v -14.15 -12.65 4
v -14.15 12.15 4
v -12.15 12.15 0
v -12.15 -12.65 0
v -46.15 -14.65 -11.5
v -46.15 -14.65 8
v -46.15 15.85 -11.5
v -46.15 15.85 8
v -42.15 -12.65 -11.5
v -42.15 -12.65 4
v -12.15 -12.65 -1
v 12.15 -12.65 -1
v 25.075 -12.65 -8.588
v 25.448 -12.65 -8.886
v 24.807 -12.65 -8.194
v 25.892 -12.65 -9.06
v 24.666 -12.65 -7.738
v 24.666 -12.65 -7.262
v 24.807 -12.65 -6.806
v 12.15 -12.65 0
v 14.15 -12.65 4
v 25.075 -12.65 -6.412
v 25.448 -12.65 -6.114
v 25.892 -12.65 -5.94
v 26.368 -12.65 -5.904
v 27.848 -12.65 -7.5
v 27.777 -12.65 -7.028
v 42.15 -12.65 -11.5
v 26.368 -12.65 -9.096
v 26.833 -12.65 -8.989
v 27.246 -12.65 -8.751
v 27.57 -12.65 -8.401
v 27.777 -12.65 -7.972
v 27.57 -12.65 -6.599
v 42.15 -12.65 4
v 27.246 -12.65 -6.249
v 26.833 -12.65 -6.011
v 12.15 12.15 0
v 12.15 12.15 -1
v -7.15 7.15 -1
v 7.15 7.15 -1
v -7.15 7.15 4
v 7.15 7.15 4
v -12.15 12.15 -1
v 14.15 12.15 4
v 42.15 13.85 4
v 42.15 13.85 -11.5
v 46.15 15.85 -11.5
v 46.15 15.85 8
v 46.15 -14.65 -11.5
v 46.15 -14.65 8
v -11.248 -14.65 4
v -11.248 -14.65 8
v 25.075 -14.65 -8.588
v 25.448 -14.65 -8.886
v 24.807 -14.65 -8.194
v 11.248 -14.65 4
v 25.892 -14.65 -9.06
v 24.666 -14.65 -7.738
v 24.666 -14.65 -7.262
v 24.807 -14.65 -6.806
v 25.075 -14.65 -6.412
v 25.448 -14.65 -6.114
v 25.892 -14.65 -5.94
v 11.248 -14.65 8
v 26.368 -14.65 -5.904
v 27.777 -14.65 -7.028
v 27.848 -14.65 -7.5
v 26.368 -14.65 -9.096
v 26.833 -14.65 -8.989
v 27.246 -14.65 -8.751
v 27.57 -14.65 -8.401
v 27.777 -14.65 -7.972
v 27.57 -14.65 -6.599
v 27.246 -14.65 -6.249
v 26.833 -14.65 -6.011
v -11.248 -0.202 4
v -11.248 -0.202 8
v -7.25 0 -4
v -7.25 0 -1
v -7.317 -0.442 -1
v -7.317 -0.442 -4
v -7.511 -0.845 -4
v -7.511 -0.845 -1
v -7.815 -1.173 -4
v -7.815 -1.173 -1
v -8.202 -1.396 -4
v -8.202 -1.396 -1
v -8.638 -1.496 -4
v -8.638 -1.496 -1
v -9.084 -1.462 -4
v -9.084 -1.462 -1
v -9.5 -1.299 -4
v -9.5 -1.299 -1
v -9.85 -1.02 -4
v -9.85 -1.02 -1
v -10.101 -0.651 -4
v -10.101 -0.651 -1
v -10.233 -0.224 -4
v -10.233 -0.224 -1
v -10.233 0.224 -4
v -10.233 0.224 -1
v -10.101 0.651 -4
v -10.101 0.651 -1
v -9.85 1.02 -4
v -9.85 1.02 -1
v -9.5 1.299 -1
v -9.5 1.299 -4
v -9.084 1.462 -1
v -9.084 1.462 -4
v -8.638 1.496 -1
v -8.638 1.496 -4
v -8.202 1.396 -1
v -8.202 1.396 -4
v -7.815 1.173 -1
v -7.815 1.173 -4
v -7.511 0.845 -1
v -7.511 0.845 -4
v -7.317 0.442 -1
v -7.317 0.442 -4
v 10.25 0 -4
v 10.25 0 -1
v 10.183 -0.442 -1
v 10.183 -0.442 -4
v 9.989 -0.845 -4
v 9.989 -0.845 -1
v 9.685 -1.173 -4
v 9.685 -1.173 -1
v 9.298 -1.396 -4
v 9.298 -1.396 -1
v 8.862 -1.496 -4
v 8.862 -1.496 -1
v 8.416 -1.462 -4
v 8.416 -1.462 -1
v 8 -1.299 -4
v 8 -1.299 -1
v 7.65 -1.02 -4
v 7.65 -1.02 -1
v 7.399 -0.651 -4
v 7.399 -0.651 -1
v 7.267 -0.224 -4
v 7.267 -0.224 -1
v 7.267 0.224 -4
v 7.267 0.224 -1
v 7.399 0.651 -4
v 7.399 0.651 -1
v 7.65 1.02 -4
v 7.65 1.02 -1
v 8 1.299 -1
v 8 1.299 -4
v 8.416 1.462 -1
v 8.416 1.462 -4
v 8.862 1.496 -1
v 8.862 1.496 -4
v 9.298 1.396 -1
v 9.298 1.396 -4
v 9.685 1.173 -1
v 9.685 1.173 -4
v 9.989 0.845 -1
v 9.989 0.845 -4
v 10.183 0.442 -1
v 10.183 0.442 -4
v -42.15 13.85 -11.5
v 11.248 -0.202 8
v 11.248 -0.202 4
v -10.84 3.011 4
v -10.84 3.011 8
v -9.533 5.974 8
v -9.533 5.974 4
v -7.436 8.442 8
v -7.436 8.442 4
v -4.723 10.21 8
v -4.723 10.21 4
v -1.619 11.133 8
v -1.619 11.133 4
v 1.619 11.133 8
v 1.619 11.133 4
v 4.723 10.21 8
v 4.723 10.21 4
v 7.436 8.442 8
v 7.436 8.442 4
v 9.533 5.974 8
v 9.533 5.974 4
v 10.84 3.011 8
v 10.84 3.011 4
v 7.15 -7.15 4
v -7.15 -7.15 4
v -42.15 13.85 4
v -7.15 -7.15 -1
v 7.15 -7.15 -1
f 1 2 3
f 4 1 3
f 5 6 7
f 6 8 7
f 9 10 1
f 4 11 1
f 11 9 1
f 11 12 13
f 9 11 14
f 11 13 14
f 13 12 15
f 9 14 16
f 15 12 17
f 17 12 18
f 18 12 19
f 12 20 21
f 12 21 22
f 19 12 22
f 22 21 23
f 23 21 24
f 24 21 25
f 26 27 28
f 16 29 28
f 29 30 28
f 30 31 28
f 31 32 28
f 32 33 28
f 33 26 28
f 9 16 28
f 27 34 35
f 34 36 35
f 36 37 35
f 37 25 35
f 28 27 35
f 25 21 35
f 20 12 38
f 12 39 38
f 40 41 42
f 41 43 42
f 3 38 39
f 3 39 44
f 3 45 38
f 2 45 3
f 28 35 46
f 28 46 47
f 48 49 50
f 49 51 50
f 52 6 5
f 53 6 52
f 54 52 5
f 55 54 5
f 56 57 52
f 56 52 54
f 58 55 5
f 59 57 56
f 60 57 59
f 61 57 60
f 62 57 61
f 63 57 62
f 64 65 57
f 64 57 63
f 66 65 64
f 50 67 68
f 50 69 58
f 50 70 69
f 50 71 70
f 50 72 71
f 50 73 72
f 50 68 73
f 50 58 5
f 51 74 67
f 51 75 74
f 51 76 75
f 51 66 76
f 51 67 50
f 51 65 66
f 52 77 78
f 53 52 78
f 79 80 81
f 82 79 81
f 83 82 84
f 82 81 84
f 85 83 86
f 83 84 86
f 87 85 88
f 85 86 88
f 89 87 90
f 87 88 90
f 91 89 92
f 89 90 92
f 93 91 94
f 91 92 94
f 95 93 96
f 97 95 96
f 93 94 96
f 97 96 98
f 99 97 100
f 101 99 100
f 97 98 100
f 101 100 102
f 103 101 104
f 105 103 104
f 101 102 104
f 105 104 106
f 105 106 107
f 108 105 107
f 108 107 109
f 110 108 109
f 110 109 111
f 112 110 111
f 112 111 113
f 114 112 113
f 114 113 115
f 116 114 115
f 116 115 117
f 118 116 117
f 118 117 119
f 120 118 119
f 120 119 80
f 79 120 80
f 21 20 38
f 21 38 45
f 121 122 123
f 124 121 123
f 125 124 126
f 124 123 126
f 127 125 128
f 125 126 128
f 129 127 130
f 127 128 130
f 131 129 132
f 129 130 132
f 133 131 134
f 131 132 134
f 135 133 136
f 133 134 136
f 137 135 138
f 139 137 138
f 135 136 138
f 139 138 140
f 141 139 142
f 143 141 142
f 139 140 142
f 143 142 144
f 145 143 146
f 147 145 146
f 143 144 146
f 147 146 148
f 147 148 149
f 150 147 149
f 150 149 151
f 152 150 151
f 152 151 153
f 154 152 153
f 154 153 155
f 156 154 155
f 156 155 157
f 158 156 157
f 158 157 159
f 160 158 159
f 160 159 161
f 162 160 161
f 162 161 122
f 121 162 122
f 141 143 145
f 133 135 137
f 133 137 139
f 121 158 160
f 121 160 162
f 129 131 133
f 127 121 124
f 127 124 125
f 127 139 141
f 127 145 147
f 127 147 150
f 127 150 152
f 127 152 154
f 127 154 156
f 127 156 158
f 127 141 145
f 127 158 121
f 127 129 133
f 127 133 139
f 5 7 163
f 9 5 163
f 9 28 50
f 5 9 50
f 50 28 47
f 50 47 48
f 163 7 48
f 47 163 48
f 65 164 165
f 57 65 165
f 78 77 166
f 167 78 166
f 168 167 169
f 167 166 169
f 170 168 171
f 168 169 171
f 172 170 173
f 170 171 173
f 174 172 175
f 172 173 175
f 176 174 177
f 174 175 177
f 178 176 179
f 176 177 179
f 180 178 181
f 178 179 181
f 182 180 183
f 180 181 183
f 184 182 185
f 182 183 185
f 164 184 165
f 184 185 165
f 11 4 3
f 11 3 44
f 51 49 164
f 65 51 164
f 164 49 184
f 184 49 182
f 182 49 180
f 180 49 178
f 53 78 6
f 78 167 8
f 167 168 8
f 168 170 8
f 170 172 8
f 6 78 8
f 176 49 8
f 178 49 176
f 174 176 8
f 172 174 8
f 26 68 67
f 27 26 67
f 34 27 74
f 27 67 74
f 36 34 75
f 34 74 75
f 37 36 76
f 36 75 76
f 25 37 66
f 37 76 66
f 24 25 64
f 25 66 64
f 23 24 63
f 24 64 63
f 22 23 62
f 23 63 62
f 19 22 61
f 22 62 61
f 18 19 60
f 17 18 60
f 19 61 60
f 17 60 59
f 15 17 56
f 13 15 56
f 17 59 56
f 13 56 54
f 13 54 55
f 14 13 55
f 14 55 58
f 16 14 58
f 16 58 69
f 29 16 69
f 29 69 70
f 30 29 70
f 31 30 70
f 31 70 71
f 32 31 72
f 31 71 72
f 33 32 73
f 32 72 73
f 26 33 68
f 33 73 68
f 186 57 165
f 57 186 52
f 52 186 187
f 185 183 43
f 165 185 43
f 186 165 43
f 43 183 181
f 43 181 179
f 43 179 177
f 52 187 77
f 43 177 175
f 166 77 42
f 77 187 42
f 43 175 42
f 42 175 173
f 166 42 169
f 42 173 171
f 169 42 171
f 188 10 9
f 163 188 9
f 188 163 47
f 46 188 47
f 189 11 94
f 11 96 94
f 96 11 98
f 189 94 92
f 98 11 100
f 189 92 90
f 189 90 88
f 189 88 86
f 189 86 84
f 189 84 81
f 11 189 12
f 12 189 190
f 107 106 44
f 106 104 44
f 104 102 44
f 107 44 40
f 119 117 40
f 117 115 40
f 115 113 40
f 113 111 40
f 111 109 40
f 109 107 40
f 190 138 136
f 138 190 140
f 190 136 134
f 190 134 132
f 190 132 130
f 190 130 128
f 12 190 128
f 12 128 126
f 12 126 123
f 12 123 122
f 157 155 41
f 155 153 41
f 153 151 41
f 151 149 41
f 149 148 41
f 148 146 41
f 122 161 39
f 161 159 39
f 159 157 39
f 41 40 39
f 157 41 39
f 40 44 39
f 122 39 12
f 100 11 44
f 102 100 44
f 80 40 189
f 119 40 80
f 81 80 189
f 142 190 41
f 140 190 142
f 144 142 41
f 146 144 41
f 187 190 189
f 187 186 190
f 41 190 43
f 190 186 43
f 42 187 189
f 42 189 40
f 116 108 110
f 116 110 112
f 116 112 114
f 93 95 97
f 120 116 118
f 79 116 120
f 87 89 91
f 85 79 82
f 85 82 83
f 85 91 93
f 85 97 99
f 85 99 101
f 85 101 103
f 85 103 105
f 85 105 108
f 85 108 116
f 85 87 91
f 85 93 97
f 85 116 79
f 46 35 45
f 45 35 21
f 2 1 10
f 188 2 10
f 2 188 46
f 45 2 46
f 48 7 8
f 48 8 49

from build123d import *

# Parameters (mm, degrees)
SKETCH1_W                       = 24.3
SKETCH1_H                       = 24.3
SKETCH1_W_2                     = 14.3
SKETCH1_H_2                     = 14.3
BOSS_EXTRUDE1_DEPTH             = 4
SKETCH3_R                       = 1.5
BOSS_EXTRUDE4_DEPTH             = 4
BOSS_EXTRUDE5_DEPTH             = 4
BOSS_EXTRUDE6_REACH             = 23.355
BOSS_EXTRUDE6_DIRECTION_2_REACH = 23.355
CUT_EXTRUDE1_DEPTH              = 11
SKETCH7_W                       = 24.3
SKETCH7_H                       = 23.3
SKETCH7_W_2                     = 14.3
SKETCH7_H_2                     = 14.3
BOSS_EXTRUDE8_DEPTH             = 1
BOSS_EXTRUDE9_DEPTH             = 1.5
BOSS_EXTRUDE10_DEPTH            = 26.5
BOSS_EXTRUDE11_DEPTH            = 2
BOSS_EXTRUDE12_DEPTH            = 2
SKETCH12_R                      = 1.6
CUT_EXTRUDE2_DEPTH              = 2


with BuildPart() as part:
    # Sketch1 → Boss-Extrude1 (new body)
    with BuildSketch(Plane.XY):
        Rectangle(SKETCH1_W, SKETCH1_H)
        Rectangle(SKETCH1_W_2, SKETCH1_H_2, mode=Mode.SUBTRACT)
    extrude(amount=BOSS_EXTRUDE1_DEPTH)

    # Sketch3 → Boss-Extrude4 (add)
    with BuildSketch(Plane(origin=(0, 0, 0), x_dir=(-1, 0, 0), z_dir=(0, 0, -1))):
        with Locations(Location((8.75, 0, 0), (0, 0, 180))):
            Circle(SKETCH3_R)
        with Locations(Location((-8.75, 0, 0), (0, 0, 180))):
            Circle(SKETCH3_R)
    extrude(amount=BOSS_EXTRUDE4_DEPTH)

    # Sketch4 → Boss-Extrude5 (add)
    with BuildSketch(Plane.XY.offset(4)):
        with BuildLine():
            Line((11.248190336, -0.201777492), (11.248190336, -11.15))
            Line((11.248190336, -11.15), (14.15, -11.15))
            Line((14.15, -11.15), (14.15, 13.85))
            Line((14.15, 13.85), (-14.15, 13.85))
            Line((-14.15, 13.85), (-14.15, -11.15))
            Line((-14.15, -11.15), (-11.248190336, -11.15))
            Line((-11.248190336, -11.15), (-11.248190336, -0.201777492))
            ThreePointArc((-11.248190336, -0.201777492), (0, 11.25), (11.248190336, -0.201777492))
        make_face()
    extrude(amount=BOSS_EXTRUDE5_DEPTH)

    # Boss-Extrude6: up to this face of the body (flat: up to its plane)
    boss_extrude6_end = Plane(part.part.faces().sort_by_distance((0, 12.15, 2))[0])
    # Sketch5 → Boss-Extrude6 (add, up to the picked face)
    with BuildSketch(Plane(origin=(0, 0, 0), x_dir=(1, 0, 0), z_dir=(0, 1, 0)), mode=Mode.PRIVATE) as boss_extrude6_sk1:
        Polygon((-12.15, 0), (-14.15, -4), (-12.15, -4), align=None)
    boss_extrude6_tool1 = split(extrude(boss_extrude6_sk1.sketch, amount=BOSS_EXTRUDE6_REACH, mode=Mode.PRIVATE), bisect_by=boss_extrude6_end, keep=Keep.BOTH, mode=Mode.PRIVATE)
    # Sketch5 → Boss-Extrude6 (add, up to the picked face)
    with BuildSketch(Plane(origin=(0, 0, 0), x_dir=(1, 0, 0), z_dir=(0, 1, 0)), mode=Mode.PRIVATE) as boss_extrude6_sk2:
        Polygon((12.15, 0), (12.15, -4), (14.15, -4), align=None)
    boss_extrude6_tool2 = split(extrude(boss_extrude6_sk2.sketch, amount=BOSS_EXTRUDE6_REACH, mode=Mode.PRIVATE), bisect_by=boss_extrude6_end, keep=Keep.BOTH, mode=Mode.PRIVATE)
    add(boss_extrude6_tool1.solids().sort_by(Axis((-12.816667, 0, 2.666667), (0, 1, 0)))[0])
    add(boss_extrude6_tool2.solids().sort_by(Axis((12.816667, 0, 2.666667), (0, 1, 0)))[0])

    # Boss-Extrude6 direction 2: up to this face of the body (flat: up to its plane)
    boss_extrude6_direction_2_end = Plane(part.part.faces().sort_by_distance((12.699095168, -11.15, 6))[0])
    # Sketch5 → Boss-Extrude6 direction 2 (add, up to the picked face)
    with BuildSketch(Plane(origin=(0, 0, 0), x_dir=(1, 0, 0), z_dir=(0, 1, 0)), mode=Mode.PRIVATE) as boss_extrude6_direction_2_sk1:
        Polygon((-12.15, 0), (-14.15, -4), (-12.15, -4), align=None)
    boss_extrude6_direction_2_tool1 = split(extrude(boss_extrude6_direction_2_sk1.sketch, amount=-BOSS_EXTRUDE6_DIRECTION_2_REACH, mode=Mode.PRIVATE), bisect_by=boss_extrude6_direction_2_end, keep=Keep.BOTH, mode=Mode.PRIVATE)
    # Sketch5 → Boss-Extrude6 direction 2 (add, up to the picked face)
    with BuildSketch(Plane(origin=(0, 0, 0), x_dir=(1, 0, 0), z_dir=(0, 1, 0)), mode=Mode.PRIVATE) as boss_extrude6_direction_2_sk2:
        Polygon((12.15, 0), (12.15, -4), (14.15, -4), align=None)
    boss_extrude6_direction_2_tool2 = split(extrude(boss_extrude6_direction_2_sk2.sketch, amount=-BOSS_EXTRUDE6_DIRECTION_2_REACH, mode=Mode.PRIVATE), bisect_by=boss_extrude6_direction_2_end, keep=Keep.BOTH, mode=Mode.PRIVATE)
    add(boss_extrude6_direction_2_tool1.solids().sort_by(Axis((-12.816667, 0, 2.666667), (0, -1, 0)))[0])
    add(boss_extrude6_direction_2_tool2.solids().sort_by(Axis((12.816667, 0, 2.666667), (0, -1, 0)))[0])

    # Sketch6 → Cut-Extrude1 (cut)
    with BuildSketch(Plane.XY.offset(4)):
        Polygon((-14.15, -11.15), (-17.465023318, -11.15), (-17.465023318, -14.474968539), (16.848397365, -14.474968539), (16.848397365, -10.738940706), (14.15, -11.15), align=None)
    extrude(amount=-CUT_EXTRUDE1_DEPTH, mode=Mode.SUBTRACT)

    # Sketch7 → Boss-Extrude8 (add)
    with BuildSketch(Plane(origin=(0, 0, 0), x_dir=(-1, 0, 0), z_dir=(0, 0, -1))):
        with Locations((0, 0.5)):
            Rectangle(SKETCH7_W, SKETCH7_H)
        Rectangle(SKETCH7_W_2, SKETCH7_H_2, mode=Mode.SUBTRACT)
    extrude(amount=BOSS_EXTRUDE8_DEPTH)

    # Sketch8 → Boss-Extrude9 (add)
    with BuildSketch(Plane.XZ.offset(11.15)):
        Polygon((-14.15, 4), (-12.15, 0), (-12.15, -1), (12.15, -1), (12.15, 0), (14.15, 4), (14.15, 8), (11.248190336, 8), (11.248190336, 4), (-11.248190336, 4), (-11.248190336, 8), (-14.15, 8), align=None)
    extrude(amount=BOSS_EXTRUDE9_DEPTH)

    # Sketch9 → Boss-Extrude10 (add)
    with BuildSketch(Plane.XZ.offset(12.65)):
        Polygon((-42.15, 4), (-42.15, -11.5), (-46.15, -11.5), (-46.15, 8), (-14.15, 8), (-14.15, 4), align=None)
        Polygon((42.15, 4), (42.15, -11.5), (46.15, -11.5), (46.15, 8), (14.15, 8), (14.15, 4), align=None)
    extrude(amount=-BOSS_EXTRUDE10_DEPTH)

    # Sketch10 → Boss-Extrude11 (add)
    with BuildSketch(Plane(origin=(0, 13.85, 0), x_dir=(1, 0, 0), z_dir=(0, 1, 0))):
        Polygon((-42.15, 11.5), (-46.15, 11.5), (-46.15, -8), (46.15, -8), (46.15, 11.5), align=None)
    extrude(amount=BOSS_EXTRUDE11_DEPTH)

    # Sketch11 → Boss-Extrude12 (add)
    with BuildSketch(Plane.XZ.offset(12.65)):
        Polygon((-11.248190336, 8), (-46.15, 8), (-46.15, -11.5), (42.15, -11.5), (46.15, -11.5), (46.15, 8), (11.248190336, 8), (11.248190336, 4), (-11.248190336, 4), align=None)
    extrude(amount=BOSS_EXTRUDE12_DEPTH)

    # Sketch12 → Cut-Extrude2 (cut)
    with BuildSketch(Plane.XZ.offset(14.65)):
        with Locations((26.248190336, -7.5)):
            Circle(SKETCH12_R)
    extrude(amount=-CUT_EXTRUDE2_DEPTH, mode=Mode.SUBTRACT)


solid = part.part
